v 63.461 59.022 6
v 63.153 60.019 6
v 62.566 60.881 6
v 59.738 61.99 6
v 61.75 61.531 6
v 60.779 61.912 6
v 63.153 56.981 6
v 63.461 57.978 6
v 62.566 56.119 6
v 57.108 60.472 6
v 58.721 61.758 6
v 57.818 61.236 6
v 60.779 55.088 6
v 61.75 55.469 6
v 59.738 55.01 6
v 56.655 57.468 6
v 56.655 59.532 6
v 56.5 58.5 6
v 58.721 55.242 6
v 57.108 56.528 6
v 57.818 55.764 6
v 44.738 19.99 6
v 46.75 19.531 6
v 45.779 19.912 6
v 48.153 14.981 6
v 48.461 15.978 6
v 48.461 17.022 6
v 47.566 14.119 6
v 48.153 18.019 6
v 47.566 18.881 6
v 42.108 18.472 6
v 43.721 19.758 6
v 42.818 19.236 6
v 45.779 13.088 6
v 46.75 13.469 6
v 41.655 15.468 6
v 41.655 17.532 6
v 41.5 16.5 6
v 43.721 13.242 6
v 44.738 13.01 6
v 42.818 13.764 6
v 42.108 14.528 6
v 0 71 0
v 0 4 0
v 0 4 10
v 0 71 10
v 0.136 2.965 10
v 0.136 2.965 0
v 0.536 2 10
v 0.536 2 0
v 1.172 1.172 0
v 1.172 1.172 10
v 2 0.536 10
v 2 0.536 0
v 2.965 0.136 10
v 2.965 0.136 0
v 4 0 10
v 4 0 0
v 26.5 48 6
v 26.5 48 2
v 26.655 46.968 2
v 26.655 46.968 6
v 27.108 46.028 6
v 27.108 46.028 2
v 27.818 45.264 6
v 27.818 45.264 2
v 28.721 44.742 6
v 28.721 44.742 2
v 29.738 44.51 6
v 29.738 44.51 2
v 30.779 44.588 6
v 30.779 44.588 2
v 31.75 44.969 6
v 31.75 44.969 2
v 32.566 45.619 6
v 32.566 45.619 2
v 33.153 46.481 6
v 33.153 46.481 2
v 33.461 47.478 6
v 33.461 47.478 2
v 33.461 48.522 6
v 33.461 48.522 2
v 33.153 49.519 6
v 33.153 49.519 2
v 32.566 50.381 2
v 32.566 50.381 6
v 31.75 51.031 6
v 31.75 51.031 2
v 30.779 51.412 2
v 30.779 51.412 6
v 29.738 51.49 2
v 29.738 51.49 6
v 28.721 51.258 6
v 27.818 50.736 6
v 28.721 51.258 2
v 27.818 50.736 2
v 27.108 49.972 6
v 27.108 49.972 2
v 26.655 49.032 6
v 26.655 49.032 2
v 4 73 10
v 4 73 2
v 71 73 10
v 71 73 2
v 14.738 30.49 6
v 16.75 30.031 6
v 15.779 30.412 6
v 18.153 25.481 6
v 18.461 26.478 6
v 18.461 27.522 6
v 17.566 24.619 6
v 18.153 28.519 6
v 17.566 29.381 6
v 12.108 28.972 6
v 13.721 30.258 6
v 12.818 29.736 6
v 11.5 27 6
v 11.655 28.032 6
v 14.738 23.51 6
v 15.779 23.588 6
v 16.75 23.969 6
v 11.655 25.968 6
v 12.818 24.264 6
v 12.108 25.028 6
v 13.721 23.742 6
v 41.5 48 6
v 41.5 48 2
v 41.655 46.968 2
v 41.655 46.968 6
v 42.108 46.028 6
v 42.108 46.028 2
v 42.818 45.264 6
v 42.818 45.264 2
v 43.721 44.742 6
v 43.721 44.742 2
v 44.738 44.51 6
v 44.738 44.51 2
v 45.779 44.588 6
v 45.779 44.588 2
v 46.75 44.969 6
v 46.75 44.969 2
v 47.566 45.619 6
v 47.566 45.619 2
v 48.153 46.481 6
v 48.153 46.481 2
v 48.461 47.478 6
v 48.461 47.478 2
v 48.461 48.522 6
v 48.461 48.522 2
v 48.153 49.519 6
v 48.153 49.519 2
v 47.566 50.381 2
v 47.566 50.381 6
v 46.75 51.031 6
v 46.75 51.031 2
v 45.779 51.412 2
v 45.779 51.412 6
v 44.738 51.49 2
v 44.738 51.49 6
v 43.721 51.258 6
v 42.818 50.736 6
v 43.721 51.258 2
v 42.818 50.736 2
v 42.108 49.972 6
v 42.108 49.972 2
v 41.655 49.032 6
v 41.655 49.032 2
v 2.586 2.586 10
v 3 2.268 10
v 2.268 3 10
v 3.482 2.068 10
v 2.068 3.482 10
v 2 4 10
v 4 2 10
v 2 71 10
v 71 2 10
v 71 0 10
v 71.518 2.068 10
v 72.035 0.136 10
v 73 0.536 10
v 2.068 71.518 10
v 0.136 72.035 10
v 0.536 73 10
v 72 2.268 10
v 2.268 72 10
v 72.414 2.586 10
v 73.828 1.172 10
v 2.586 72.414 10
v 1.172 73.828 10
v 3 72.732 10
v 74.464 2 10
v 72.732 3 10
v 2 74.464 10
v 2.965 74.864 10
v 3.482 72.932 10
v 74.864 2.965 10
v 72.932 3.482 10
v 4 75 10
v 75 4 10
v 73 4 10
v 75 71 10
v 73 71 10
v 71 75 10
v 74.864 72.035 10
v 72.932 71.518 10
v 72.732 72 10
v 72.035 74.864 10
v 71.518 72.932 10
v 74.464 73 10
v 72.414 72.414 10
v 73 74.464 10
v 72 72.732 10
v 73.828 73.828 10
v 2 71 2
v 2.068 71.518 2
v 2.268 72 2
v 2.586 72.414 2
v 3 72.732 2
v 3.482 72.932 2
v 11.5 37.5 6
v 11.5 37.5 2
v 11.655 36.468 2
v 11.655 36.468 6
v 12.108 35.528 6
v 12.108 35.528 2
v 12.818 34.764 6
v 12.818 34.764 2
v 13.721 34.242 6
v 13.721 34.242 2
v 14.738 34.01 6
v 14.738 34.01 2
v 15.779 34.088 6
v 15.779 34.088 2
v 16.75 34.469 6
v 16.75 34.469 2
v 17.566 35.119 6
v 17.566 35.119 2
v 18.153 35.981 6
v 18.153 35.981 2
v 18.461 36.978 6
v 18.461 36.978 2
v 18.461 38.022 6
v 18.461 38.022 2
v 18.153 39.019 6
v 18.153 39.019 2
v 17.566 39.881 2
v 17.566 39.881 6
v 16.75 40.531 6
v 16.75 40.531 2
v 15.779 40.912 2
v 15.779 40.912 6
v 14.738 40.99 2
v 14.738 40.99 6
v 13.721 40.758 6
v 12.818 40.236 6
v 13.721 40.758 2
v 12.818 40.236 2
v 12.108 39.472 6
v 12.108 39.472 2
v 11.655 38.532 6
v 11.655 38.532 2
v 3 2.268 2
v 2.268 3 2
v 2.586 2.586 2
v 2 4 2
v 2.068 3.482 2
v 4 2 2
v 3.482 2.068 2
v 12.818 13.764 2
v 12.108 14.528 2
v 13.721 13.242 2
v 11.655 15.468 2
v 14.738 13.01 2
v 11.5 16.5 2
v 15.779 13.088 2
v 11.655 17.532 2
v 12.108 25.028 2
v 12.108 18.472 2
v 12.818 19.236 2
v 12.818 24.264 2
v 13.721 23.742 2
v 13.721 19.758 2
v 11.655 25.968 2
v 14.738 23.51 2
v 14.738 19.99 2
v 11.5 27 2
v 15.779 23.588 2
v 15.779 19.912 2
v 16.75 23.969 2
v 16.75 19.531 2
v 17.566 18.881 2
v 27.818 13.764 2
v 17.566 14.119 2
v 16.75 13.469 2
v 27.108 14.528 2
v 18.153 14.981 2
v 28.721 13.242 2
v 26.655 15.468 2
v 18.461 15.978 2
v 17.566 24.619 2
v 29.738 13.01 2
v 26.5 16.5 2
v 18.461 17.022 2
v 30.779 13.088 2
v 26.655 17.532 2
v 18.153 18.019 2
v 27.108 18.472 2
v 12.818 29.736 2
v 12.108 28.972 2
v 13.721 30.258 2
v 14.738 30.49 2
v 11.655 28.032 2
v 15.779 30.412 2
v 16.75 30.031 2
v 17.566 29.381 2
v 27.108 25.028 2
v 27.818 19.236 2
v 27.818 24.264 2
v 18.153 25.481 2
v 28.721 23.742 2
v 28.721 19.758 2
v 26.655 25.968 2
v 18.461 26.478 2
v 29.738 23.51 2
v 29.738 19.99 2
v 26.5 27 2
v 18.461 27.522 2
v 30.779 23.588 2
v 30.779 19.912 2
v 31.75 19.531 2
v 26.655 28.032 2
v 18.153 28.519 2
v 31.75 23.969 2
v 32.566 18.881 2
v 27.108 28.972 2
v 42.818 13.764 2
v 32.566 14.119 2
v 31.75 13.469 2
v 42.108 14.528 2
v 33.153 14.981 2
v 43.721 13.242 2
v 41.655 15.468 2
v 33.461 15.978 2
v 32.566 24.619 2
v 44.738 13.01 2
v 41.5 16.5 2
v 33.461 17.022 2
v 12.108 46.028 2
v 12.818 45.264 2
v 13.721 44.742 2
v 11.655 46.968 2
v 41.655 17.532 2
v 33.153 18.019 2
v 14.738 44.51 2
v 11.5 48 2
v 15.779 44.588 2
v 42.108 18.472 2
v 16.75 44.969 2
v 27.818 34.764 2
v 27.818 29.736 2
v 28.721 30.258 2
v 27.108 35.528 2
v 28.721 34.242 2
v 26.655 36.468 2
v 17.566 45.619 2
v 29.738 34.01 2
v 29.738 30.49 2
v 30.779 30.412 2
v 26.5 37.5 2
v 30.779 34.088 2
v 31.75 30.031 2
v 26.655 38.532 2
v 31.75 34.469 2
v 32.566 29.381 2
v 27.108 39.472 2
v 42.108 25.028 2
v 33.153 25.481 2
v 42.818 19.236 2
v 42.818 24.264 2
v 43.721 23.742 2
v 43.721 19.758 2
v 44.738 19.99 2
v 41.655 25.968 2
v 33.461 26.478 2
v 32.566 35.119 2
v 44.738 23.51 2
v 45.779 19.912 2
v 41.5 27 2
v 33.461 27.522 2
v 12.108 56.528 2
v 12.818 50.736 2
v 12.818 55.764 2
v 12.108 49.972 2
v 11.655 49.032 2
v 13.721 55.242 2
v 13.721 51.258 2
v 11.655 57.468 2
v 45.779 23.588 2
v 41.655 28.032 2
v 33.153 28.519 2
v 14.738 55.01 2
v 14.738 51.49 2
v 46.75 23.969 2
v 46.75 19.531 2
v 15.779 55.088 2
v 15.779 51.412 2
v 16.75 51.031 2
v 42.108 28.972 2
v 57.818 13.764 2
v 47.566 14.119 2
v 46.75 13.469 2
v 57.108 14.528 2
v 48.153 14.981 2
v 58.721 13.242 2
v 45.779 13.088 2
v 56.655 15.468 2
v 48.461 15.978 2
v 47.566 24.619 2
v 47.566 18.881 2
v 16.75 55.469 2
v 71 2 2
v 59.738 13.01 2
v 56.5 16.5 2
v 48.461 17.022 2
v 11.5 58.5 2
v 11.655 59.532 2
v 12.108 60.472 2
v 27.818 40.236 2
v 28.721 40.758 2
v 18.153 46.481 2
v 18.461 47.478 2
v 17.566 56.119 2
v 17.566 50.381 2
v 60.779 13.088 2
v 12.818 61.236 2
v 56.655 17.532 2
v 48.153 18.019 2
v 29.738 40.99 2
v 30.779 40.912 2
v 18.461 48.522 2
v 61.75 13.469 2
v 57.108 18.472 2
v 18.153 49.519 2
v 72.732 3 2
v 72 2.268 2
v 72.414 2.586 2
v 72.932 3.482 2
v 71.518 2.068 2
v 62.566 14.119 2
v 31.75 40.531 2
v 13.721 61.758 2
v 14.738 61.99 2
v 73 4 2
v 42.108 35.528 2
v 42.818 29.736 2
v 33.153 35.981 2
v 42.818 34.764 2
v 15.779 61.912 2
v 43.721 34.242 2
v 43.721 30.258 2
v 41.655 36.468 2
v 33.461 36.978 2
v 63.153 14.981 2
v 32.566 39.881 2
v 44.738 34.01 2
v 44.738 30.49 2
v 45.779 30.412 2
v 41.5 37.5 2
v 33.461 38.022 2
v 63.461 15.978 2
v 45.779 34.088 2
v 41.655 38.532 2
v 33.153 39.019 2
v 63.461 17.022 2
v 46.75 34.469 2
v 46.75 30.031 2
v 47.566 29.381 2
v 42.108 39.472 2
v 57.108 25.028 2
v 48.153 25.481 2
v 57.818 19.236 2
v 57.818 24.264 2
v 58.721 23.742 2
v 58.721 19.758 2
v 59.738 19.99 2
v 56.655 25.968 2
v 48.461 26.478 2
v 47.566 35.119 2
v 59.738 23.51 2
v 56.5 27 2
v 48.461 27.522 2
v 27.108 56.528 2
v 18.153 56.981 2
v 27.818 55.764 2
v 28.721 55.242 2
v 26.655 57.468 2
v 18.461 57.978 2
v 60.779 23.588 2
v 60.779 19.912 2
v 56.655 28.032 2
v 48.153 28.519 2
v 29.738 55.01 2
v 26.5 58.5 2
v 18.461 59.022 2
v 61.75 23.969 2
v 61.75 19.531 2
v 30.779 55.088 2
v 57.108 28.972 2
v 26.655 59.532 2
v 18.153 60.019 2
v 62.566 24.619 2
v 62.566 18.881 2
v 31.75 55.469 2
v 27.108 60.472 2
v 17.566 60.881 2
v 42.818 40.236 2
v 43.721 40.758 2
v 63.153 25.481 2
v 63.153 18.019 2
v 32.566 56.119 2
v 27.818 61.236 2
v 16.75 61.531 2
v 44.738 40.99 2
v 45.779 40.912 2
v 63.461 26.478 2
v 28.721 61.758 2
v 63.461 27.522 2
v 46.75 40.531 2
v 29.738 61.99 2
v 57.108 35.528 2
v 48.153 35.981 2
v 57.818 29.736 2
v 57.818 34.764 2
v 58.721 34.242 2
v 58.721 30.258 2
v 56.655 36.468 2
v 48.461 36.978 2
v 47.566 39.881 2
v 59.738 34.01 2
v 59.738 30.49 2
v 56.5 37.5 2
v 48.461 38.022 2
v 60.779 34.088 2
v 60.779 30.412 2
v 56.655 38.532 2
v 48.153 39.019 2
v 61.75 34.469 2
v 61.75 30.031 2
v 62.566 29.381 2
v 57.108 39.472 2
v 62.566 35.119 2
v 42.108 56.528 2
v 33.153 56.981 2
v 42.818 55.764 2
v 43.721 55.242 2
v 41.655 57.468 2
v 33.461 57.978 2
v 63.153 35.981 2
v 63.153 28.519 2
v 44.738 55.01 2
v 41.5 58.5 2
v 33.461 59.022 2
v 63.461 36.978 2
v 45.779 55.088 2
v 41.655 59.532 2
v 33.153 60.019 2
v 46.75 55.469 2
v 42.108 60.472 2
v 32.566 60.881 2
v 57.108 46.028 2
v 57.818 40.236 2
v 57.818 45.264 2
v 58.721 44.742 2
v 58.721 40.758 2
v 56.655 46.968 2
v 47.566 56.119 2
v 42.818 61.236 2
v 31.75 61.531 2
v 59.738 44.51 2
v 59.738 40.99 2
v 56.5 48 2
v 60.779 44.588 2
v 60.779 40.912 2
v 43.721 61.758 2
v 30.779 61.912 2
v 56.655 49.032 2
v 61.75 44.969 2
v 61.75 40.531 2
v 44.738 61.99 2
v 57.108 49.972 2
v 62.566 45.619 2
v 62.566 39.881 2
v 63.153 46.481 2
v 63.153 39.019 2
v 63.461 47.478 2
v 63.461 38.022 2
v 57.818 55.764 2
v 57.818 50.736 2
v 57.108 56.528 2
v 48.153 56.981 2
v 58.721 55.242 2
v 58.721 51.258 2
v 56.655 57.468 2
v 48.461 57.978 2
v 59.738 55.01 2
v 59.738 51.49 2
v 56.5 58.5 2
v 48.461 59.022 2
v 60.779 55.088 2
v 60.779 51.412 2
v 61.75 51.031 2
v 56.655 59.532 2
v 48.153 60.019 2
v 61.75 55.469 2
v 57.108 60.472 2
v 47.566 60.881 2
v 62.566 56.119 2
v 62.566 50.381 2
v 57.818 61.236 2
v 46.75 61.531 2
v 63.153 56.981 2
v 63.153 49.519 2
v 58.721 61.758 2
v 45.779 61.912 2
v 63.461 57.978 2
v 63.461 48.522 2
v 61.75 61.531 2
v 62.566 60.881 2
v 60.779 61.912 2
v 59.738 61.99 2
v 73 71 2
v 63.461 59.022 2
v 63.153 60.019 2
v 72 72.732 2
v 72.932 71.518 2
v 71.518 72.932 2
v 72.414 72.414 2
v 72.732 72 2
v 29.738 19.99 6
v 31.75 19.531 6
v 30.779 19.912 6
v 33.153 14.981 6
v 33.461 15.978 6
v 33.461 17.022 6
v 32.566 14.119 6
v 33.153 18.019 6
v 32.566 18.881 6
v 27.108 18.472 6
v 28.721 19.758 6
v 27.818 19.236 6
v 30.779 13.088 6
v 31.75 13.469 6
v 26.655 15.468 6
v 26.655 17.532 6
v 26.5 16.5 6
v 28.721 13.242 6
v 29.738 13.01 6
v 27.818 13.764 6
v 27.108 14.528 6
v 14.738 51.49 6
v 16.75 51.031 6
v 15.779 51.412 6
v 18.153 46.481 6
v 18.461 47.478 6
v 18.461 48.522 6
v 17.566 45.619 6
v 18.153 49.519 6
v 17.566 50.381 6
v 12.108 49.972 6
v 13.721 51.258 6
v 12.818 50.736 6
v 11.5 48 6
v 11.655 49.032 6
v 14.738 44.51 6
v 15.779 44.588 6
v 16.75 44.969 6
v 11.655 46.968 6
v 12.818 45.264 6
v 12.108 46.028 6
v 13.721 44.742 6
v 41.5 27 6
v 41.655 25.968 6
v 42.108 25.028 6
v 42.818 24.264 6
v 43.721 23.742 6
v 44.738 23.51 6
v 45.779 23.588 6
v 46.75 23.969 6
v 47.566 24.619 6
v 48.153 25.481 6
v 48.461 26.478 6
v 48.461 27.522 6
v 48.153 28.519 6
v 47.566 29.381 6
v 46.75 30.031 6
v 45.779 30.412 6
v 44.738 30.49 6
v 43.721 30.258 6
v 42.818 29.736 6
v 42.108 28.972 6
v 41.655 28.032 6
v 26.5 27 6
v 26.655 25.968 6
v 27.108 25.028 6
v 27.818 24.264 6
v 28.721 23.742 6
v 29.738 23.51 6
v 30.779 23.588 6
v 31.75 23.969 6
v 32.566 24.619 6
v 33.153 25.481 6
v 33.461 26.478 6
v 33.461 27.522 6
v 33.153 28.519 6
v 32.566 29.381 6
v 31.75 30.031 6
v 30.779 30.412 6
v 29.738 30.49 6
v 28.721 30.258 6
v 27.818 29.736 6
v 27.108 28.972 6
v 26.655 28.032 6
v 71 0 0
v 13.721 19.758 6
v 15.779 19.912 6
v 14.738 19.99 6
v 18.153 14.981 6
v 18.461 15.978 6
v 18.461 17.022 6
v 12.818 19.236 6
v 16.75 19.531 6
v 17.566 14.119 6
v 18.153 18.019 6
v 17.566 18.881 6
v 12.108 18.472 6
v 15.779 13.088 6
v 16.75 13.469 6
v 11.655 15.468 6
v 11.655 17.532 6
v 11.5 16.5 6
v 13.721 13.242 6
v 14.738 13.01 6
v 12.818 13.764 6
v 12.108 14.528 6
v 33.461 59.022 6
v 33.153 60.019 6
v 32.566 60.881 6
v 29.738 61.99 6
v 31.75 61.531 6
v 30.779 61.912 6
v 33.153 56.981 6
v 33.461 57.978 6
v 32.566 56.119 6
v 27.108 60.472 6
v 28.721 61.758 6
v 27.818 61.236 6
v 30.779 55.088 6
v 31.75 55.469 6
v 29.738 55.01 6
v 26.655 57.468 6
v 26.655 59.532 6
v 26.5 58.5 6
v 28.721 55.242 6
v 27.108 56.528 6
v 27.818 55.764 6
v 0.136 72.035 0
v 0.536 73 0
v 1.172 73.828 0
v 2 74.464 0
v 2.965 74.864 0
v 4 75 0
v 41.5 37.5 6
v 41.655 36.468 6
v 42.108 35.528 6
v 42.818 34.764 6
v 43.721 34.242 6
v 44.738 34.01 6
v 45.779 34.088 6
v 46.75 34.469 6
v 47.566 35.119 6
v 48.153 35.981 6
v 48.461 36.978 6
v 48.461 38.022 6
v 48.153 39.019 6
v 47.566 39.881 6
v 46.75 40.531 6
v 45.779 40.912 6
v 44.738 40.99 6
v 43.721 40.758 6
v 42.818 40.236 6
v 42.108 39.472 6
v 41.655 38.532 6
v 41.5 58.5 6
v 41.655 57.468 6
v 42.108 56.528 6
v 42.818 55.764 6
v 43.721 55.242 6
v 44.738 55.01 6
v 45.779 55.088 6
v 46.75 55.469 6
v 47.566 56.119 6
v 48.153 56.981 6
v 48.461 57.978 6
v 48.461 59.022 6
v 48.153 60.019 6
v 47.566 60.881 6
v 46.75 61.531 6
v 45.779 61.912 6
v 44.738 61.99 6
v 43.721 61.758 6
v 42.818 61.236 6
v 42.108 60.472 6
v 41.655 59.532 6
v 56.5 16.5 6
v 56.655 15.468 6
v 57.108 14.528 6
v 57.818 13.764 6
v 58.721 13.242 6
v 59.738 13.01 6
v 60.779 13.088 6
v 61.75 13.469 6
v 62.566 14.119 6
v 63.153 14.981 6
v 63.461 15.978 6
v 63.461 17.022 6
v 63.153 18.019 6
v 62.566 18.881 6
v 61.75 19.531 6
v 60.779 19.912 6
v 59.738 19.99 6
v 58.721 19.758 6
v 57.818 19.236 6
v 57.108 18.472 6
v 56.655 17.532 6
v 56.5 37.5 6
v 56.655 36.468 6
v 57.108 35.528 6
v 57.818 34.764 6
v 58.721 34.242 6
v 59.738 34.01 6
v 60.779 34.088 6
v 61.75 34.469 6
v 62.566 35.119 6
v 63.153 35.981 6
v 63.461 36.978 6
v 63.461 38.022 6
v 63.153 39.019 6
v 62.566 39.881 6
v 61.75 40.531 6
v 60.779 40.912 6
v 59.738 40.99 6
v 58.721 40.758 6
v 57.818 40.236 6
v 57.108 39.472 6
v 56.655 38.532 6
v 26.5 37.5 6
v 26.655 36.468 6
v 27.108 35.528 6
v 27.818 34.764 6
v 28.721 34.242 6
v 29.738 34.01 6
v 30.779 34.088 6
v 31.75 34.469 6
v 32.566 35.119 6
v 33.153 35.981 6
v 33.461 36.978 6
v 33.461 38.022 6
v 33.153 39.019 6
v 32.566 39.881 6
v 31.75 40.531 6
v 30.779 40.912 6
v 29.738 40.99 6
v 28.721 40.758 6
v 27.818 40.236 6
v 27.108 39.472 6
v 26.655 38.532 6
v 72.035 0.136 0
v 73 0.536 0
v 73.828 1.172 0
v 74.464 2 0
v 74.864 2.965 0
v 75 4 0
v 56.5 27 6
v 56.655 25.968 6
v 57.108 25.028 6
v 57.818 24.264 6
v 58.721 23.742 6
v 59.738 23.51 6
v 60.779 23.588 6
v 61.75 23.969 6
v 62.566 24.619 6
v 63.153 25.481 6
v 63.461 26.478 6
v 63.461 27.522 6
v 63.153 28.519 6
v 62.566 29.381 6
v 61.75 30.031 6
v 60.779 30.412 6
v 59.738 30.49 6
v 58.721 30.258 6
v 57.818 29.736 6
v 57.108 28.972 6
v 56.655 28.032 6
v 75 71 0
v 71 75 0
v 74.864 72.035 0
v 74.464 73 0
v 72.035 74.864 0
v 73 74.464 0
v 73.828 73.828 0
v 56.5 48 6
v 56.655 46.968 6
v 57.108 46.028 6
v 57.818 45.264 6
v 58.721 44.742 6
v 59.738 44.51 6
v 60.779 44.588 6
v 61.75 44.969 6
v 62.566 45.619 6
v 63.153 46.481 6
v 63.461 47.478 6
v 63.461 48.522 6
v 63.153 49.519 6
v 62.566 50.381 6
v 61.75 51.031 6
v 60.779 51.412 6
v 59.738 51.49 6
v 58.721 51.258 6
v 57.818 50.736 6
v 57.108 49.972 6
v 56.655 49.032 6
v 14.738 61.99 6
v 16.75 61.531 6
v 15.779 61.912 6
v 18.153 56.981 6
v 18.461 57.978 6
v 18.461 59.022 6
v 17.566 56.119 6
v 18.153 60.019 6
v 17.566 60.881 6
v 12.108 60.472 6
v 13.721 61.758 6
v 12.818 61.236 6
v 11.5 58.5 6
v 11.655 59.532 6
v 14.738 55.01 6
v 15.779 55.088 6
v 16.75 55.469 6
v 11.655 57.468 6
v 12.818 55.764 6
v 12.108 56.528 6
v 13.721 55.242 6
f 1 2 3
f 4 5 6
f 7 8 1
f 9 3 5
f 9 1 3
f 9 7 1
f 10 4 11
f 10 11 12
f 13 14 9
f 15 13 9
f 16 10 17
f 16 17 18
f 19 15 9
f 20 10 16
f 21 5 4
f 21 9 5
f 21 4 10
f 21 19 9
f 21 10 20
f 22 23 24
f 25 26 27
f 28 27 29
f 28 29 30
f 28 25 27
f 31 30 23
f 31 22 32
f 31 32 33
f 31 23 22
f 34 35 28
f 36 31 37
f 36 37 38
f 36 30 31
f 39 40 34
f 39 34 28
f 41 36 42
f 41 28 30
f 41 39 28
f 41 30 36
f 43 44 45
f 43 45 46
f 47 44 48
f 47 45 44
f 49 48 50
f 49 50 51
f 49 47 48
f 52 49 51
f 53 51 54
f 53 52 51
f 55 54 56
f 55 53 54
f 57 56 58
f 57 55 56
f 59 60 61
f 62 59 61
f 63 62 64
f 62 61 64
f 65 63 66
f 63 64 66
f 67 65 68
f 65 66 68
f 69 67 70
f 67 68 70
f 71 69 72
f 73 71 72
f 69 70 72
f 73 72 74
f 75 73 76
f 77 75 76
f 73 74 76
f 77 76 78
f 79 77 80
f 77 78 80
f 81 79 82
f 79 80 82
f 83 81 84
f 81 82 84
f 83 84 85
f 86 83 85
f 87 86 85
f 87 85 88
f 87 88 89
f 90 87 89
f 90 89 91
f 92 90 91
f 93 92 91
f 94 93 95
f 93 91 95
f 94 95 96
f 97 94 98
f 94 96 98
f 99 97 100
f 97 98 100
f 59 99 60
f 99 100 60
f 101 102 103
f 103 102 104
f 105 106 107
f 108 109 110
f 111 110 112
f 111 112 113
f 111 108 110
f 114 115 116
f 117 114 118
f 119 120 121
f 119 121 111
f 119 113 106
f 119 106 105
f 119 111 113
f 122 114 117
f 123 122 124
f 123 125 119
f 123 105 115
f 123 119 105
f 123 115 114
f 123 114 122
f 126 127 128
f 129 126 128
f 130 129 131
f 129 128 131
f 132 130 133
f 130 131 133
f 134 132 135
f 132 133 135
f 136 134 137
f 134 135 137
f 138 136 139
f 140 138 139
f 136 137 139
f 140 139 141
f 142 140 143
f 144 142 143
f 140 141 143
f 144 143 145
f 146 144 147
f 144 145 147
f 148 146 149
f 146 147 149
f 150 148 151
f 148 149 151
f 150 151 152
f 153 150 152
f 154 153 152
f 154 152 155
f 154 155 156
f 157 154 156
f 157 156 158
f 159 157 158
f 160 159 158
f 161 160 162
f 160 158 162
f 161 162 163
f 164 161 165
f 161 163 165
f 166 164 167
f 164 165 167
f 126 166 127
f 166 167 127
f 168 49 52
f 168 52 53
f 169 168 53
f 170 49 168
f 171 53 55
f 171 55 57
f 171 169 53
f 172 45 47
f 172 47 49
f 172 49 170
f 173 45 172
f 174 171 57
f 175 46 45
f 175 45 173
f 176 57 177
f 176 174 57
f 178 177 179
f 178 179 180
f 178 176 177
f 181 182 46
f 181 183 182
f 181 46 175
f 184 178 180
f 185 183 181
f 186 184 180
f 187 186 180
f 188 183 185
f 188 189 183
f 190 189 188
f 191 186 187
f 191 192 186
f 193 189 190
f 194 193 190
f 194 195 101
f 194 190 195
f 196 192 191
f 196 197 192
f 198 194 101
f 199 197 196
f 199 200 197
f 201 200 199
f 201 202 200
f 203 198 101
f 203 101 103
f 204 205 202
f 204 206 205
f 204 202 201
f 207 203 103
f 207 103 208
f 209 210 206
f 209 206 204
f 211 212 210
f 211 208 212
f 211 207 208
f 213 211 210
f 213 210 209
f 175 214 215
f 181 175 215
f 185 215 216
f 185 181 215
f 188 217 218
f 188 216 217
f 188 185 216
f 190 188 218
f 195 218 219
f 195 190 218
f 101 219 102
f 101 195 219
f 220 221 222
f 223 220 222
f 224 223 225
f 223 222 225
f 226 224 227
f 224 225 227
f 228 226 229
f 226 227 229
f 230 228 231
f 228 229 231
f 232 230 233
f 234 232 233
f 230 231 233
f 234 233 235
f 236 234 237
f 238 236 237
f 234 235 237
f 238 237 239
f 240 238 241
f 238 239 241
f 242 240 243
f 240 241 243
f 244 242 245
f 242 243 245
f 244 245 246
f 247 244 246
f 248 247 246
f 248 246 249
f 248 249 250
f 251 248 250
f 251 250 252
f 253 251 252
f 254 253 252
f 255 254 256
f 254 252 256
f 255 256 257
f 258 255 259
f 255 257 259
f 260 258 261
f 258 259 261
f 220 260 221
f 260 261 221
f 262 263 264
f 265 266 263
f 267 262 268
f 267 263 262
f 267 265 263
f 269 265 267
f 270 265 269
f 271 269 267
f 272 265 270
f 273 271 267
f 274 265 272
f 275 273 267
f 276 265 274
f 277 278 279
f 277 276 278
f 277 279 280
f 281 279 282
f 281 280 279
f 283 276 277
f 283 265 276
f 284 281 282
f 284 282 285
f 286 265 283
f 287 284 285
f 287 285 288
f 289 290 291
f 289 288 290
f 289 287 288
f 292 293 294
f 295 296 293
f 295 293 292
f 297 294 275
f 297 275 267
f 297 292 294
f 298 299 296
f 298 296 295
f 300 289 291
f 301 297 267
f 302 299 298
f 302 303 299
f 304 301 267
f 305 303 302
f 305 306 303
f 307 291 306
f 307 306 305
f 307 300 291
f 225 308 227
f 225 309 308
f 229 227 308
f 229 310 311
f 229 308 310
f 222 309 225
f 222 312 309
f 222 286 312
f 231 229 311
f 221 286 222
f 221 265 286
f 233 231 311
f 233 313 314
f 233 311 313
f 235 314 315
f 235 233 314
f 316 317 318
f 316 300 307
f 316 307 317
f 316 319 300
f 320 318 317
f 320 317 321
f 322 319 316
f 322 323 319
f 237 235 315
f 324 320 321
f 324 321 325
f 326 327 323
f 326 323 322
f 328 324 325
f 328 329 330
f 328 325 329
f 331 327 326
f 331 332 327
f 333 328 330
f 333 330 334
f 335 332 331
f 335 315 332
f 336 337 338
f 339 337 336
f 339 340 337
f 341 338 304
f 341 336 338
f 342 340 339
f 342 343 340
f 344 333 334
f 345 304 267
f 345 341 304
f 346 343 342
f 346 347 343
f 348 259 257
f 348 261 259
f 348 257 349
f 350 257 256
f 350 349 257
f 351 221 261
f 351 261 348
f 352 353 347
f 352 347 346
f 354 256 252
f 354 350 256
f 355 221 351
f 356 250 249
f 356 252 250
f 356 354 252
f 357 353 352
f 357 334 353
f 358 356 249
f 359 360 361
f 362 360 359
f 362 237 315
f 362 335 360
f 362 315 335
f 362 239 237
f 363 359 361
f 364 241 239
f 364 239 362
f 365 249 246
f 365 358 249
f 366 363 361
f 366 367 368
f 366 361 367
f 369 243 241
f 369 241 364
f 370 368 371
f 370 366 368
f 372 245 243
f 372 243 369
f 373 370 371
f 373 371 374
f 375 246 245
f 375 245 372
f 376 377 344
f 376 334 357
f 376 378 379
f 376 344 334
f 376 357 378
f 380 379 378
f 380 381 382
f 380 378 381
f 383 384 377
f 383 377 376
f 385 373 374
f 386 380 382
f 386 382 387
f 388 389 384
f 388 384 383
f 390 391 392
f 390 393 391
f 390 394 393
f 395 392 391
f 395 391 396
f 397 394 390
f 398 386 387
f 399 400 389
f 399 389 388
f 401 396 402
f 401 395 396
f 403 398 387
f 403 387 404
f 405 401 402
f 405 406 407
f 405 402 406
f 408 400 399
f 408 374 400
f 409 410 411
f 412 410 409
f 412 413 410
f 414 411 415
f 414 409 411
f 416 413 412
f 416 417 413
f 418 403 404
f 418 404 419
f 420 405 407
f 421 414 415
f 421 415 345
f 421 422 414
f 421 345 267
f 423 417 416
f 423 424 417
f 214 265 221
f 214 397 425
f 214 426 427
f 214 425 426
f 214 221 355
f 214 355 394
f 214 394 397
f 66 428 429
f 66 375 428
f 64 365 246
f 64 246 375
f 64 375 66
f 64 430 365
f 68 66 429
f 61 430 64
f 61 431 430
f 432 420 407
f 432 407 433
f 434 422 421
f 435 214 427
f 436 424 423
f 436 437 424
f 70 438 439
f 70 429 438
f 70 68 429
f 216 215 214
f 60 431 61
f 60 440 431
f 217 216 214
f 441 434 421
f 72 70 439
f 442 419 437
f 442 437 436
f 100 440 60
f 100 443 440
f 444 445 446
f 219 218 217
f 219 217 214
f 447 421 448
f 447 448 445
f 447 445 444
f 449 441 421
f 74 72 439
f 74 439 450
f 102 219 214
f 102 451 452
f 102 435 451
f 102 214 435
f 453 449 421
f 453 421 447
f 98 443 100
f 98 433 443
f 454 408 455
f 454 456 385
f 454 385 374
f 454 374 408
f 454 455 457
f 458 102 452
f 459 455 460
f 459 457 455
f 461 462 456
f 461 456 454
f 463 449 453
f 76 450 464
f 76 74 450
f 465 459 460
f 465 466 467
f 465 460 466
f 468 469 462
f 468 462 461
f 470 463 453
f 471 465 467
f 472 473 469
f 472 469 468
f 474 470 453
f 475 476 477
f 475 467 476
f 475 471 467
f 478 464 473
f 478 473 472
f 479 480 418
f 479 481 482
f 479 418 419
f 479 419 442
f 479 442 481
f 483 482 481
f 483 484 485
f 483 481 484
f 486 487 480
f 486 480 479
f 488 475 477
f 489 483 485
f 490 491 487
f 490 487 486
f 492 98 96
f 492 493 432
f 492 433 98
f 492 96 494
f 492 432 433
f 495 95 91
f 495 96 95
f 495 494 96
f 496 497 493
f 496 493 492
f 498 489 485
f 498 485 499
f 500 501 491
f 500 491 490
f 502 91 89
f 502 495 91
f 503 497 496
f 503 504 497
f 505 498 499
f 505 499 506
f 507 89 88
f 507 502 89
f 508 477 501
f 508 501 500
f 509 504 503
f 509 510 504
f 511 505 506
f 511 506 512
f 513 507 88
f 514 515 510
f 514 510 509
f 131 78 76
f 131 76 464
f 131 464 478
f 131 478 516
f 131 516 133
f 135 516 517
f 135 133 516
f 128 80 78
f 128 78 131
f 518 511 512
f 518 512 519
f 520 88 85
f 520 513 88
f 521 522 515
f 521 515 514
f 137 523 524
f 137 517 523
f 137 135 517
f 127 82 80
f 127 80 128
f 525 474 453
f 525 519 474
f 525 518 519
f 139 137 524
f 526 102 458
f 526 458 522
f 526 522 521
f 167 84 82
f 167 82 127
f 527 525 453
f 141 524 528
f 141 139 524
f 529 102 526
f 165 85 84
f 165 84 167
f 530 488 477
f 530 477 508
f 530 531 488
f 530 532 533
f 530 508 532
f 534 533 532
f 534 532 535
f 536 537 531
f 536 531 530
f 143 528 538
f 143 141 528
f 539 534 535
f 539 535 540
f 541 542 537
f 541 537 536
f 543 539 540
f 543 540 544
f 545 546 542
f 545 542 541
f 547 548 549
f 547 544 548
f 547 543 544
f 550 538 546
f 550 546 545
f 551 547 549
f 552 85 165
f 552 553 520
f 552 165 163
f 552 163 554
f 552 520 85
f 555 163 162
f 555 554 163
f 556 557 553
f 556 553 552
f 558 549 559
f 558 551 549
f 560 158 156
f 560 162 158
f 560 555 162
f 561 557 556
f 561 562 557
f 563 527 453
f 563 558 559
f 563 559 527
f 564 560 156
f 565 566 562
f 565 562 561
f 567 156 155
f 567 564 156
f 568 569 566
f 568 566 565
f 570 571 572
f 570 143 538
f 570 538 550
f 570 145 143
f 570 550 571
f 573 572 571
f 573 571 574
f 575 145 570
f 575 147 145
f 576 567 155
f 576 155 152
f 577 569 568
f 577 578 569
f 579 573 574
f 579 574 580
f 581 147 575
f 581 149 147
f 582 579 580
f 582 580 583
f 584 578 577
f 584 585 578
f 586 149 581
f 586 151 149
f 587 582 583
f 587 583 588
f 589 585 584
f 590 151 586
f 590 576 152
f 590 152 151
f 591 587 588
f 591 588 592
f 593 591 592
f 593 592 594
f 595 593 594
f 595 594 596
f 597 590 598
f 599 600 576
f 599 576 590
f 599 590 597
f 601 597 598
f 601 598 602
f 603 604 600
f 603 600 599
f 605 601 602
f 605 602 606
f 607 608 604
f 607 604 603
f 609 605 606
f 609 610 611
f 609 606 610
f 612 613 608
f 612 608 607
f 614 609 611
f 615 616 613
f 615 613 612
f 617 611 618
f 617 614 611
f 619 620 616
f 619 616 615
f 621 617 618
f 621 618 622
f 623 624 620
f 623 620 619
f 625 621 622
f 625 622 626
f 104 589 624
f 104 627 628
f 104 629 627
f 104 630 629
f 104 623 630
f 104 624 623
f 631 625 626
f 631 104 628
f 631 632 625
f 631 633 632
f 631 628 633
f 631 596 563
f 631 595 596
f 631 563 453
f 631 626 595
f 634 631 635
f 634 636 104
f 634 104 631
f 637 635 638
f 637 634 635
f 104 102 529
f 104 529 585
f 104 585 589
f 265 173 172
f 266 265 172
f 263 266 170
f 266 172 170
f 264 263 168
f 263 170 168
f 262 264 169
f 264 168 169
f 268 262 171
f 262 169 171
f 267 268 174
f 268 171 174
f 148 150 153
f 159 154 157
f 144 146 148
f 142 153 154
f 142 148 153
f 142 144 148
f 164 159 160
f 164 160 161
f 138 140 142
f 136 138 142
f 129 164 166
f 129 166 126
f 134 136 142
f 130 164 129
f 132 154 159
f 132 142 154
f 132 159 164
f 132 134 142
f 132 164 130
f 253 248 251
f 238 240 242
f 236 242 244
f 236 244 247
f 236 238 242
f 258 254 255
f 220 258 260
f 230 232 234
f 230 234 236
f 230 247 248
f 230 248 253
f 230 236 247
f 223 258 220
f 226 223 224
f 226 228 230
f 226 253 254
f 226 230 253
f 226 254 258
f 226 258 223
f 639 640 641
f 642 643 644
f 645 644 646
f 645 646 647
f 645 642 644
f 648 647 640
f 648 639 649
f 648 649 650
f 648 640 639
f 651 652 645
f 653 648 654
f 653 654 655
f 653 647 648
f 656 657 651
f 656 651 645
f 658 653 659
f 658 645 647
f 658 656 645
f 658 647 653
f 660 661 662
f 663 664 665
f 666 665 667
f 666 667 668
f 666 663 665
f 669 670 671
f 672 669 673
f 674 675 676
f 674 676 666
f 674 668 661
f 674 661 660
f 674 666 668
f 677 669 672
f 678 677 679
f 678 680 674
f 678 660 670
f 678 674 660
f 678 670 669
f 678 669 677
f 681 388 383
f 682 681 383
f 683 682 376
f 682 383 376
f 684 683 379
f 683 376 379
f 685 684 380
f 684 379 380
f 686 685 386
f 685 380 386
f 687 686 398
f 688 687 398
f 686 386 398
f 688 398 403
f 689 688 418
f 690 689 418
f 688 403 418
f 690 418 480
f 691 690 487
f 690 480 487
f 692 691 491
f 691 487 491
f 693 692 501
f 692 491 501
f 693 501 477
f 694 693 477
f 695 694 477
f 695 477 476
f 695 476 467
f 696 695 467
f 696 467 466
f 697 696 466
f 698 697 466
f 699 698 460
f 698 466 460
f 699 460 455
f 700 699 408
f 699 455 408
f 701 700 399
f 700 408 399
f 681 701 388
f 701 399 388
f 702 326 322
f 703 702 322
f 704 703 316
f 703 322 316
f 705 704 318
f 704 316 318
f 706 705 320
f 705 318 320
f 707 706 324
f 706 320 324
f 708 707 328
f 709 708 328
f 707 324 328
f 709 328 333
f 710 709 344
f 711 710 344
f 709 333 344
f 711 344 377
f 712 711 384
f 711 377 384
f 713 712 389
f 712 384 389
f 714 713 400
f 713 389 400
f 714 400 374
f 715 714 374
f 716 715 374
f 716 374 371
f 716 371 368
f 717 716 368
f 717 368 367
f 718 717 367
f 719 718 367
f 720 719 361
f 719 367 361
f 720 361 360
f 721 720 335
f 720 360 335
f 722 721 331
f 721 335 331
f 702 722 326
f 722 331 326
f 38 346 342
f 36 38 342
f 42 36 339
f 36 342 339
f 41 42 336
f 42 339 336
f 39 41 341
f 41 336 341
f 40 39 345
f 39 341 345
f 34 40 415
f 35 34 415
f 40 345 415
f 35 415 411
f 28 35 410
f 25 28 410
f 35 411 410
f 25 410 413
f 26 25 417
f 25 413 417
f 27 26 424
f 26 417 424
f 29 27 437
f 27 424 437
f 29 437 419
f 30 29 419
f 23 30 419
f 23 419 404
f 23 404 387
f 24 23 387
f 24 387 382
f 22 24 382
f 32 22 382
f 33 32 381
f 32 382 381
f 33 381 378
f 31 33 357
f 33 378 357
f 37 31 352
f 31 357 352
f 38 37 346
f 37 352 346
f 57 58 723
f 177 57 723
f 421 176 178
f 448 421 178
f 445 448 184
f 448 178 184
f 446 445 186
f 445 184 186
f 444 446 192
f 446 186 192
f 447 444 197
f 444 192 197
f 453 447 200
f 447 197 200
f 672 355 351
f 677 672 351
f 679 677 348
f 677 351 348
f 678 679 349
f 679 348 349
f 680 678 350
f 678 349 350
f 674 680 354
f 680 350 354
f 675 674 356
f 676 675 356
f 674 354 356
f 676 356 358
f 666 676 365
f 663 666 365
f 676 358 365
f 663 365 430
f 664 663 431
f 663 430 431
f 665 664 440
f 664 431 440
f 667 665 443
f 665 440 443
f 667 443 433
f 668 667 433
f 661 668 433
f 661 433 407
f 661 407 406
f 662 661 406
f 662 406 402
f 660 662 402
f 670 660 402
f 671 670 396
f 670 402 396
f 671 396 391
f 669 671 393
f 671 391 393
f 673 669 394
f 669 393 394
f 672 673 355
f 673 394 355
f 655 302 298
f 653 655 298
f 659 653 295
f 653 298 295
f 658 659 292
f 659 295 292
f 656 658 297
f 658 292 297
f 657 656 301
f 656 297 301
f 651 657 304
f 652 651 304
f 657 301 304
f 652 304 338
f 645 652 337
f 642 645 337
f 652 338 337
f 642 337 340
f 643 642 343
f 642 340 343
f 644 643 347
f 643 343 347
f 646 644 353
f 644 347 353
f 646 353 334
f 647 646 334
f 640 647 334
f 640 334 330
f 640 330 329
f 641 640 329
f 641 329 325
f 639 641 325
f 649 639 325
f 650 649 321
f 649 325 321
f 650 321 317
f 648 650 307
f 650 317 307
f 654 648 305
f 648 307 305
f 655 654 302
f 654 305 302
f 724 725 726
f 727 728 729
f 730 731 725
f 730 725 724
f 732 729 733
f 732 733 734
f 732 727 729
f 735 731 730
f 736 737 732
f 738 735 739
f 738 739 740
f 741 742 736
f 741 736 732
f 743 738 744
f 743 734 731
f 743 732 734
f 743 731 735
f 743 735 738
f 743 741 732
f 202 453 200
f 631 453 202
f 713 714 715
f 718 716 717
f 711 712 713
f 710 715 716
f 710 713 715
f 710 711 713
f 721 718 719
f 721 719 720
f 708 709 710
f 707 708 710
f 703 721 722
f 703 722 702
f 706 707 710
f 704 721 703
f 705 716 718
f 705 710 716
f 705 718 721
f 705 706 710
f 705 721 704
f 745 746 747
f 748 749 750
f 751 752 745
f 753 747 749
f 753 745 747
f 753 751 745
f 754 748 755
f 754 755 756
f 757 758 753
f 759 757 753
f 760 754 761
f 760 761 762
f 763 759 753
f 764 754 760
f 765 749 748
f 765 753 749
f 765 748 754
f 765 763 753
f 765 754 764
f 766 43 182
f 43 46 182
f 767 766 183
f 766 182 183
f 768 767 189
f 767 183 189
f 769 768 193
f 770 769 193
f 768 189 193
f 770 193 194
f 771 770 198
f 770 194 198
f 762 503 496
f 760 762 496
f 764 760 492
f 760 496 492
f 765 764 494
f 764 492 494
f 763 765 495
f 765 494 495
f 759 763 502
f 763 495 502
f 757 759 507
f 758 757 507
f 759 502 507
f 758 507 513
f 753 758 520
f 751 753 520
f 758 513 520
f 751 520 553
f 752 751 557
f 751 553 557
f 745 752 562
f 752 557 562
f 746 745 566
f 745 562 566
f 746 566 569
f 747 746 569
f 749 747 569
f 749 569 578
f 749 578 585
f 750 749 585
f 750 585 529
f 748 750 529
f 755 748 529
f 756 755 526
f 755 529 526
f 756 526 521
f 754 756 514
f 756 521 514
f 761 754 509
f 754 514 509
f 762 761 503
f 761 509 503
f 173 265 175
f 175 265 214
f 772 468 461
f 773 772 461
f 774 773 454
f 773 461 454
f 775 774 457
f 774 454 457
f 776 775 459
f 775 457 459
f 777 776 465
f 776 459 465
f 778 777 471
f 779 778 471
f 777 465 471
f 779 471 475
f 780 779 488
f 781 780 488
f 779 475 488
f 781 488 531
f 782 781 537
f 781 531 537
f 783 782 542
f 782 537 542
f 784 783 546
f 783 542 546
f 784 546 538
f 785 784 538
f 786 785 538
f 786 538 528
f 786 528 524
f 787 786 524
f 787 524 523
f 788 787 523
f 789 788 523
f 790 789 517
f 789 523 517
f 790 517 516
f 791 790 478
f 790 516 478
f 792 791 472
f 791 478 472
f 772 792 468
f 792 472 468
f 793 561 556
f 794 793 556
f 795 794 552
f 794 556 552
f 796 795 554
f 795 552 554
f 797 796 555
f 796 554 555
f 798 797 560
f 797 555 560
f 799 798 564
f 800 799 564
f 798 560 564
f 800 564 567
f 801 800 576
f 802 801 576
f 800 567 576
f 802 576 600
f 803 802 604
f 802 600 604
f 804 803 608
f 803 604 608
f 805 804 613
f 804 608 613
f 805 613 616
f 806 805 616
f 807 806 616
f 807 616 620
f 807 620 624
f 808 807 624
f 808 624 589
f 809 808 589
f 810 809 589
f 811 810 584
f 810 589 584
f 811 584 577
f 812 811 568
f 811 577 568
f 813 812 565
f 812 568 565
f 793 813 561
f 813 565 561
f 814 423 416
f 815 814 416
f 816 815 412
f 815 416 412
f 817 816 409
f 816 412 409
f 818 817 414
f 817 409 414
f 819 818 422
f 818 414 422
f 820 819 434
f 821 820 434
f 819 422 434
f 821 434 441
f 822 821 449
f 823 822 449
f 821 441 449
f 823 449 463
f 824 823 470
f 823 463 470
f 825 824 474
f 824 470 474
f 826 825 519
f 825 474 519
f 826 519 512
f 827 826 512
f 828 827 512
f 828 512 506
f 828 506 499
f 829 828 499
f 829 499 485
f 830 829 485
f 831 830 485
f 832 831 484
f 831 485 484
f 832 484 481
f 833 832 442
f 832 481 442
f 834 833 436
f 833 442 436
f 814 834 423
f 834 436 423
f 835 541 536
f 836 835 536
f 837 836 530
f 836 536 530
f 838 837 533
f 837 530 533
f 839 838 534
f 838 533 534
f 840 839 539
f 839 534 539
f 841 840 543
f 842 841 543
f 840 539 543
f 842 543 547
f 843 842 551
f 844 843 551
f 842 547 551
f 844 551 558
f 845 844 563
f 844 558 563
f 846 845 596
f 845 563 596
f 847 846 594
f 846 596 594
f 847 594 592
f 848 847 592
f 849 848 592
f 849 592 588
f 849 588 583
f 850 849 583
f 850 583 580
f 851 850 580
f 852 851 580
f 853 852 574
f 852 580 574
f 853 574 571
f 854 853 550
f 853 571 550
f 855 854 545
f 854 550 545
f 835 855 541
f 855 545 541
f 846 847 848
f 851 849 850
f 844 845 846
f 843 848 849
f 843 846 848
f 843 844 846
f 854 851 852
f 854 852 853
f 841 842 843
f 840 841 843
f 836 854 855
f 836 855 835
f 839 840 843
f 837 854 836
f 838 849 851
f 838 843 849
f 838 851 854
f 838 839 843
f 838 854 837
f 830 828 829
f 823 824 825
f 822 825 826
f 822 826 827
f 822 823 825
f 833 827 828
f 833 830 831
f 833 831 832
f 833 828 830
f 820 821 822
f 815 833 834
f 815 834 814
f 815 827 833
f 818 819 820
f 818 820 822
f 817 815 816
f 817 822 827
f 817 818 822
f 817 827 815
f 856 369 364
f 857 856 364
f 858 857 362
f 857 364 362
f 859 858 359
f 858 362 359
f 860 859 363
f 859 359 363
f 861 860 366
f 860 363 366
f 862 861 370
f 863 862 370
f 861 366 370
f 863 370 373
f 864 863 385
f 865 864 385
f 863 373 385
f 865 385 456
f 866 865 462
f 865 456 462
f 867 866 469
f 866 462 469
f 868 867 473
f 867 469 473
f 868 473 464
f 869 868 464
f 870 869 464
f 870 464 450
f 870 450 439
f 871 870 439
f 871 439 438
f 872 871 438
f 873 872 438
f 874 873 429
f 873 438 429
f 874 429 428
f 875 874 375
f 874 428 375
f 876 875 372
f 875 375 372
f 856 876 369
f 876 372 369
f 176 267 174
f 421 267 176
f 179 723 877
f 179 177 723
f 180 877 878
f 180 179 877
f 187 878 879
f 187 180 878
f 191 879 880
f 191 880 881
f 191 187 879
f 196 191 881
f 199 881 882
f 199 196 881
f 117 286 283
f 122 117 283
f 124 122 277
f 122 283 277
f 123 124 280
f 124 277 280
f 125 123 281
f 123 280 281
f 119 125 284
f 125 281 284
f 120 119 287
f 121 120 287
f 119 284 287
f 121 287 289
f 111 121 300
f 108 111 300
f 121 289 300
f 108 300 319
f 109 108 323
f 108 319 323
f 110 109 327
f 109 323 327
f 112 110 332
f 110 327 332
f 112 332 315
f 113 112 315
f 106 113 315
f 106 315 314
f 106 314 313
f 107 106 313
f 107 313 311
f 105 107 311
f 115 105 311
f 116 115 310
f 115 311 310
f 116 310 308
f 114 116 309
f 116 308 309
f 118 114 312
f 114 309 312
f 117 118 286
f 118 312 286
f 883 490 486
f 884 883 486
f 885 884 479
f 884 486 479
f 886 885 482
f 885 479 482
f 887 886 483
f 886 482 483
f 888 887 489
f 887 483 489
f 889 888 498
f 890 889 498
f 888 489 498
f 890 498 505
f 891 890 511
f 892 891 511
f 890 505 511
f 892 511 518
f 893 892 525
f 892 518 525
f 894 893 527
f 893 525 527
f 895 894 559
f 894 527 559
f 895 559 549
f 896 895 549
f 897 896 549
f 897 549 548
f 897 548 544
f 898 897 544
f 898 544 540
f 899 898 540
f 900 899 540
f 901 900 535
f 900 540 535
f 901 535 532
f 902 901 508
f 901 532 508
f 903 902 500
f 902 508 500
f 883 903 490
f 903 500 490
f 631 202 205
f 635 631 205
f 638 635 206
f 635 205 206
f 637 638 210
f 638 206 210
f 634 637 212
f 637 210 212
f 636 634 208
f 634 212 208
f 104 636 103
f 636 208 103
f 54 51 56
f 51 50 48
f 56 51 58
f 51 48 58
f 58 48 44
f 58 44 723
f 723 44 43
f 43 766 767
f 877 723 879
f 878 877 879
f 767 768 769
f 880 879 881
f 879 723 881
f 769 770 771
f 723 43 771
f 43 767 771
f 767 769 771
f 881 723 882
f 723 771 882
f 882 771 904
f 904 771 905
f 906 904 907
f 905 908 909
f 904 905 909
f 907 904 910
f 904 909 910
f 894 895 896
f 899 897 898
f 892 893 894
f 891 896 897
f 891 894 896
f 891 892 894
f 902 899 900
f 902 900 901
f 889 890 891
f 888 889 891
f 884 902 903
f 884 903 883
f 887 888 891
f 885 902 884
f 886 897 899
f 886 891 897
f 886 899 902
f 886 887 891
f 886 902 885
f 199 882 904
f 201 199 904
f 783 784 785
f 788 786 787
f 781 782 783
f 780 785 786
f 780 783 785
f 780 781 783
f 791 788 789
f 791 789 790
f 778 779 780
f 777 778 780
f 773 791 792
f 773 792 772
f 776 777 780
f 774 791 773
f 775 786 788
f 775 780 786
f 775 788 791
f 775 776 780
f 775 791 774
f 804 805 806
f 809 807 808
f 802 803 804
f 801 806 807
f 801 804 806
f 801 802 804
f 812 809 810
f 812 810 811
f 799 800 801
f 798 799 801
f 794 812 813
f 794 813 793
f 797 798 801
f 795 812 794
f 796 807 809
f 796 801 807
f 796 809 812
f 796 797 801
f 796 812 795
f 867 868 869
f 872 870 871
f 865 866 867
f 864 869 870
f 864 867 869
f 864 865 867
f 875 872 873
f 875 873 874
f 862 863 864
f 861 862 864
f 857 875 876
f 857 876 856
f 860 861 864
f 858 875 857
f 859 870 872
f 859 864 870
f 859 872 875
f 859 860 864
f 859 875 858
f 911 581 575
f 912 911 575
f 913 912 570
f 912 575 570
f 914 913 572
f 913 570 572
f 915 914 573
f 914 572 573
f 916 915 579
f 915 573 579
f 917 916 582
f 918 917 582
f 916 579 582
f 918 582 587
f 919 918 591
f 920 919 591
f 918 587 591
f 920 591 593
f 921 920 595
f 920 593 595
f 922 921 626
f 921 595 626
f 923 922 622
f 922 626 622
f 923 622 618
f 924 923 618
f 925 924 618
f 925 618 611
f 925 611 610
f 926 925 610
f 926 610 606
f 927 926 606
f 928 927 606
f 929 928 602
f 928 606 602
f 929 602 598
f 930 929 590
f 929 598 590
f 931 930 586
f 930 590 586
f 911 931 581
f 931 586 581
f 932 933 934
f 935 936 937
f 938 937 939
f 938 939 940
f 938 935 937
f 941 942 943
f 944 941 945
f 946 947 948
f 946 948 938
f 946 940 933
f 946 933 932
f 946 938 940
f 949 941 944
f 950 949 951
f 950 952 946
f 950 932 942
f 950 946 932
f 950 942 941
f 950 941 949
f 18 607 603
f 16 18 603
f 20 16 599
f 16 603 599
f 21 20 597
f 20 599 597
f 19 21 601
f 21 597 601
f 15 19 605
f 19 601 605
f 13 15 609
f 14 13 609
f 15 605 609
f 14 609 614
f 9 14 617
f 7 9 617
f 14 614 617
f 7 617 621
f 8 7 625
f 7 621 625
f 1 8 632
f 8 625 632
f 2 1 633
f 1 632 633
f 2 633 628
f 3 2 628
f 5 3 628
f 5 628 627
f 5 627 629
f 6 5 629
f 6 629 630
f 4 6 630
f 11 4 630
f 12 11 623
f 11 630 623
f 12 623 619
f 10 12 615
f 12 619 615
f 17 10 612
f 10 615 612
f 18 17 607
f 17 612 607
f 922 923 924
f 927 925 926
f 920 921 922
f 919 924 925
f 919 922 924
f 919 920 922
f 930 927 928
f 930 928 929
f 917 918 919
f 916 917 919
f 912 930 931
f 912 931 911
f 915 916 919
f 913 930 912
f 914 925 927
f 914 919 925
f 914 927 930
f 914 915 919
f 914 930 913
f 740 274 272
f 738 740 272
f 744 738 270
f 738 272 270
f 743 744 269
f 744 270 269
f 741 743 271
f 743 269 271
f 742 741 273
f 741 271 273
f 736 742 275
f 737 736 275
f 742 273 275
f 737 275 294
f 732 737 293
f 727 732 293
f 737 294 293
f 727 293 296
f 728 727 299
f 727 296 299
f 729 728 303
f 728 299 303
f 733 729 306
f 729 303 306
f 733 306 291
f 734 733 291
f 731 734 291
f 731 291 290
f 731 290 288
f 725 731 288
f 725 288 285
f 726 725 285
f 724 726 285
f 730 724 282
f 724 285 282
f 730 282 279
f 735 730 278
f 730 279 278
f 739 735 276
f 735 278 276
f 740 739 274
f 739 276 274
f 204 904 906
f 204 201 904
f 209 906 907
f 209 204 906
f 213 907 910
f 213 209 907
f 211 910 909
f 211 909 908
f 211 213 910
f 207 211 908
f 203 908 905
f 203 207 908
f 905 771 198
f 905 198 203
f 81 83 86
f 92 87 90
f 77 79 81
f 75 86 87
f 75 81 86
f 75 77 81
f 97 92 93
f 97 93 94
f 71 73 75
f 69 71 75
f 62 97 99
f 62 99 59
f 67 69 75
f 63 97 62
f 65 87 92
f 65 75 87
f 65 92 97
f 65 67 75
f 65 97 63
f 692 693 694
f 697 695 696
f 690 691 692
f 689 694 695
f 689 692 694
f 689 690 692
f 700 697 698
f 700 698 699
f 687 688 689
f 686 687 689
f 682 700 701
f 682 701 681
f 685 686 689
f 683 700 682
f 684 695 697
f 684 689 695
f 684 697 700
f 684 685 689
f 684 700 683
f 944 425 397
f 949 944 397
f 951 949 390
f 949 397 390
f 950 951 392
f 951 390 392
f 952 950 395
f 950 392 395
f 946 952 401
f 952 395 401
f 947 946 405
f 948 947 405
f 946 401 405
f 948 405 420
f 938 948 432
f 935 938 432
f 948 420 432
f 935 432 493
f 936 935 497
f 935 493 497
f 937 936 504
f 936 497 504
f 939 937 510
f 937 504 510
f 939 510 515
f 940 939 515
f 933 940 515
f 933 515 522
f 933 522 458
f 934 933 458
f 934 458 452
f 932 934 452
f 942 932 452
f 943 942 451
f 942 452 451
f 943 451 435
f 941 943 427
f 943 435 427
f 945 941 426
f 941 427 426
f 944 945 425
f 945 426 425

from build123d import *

# Parameters (mm, degrees)
SKETCH1_W           = 75
SKETCH1_H           = 75
BOSS_EXTRUDE1_DEPTH = 10
FILLET1_R           = 4
SHELL1_T            = -2
SKETCH2_R           = 3.5
BOSS_EXTRUDE2_DEPTH = 4


with BuildPart() as part:
    # Sketch1 → Boss-Extrude1 (new body)
    with BuildSketch(Plane.XY):
        with Locations((37.5, 37.5)):
            Rectangle(SKETCH1_W, SKETCH1_H)
    extrude(amount=BOSS_EXTRUDE1_DEPTH)

    # Fillet1
    fillet1_edges = [part.edges().sort_by_distance(p)[0] for p in [
        (0, 75, 5),
        (75, 75, 5),
        (75, 0, 5),
        (0, 0, 5),
    ]]
    fillet(fillet1_edges, radius=FILLET1_R)

    # Shell1
    shell1_openings = [part.faces().sort_by_distance(p)[0] for p in [
        (37.5, 37.5, 10),
    ]]
    offset(amount=SHELL1_T, openings=shell1_openings, kind=Kind.INTERSECTION)

    # Sketch2 → Boss-Extrude2 (add)
    with BuildSketch(Plane.XY.offset(2)):
        with Locations(Location((15, 58.5, 0), (0, 0, 180))):
            Circle(SKETCH2_R)
        with Locations(Location((30, 58.5, 0), (0, 0, 180))):
            Circle(SKETCH2_R)
        with Locations(Location((45, 58.5, 0), (0, 0, 180))):
            Circle(SKETCH2_R)
        with Locations(Location((60, 58.5, 0), (0, 0, 180))):
            Circle(SKETCH2_R)
        with Locations(Location((30, 48, 0), (0, 0, 180))):
            Circle(SKETCH2_R)
        with Locations(Location((45, 48, 0), (0, 0, 180))):
            Circle(SKETCH2_R)
        with Locations(Location((60, 48, 0), (0, 0, 180))):
            Circle(SKETCH2_R)
        with Locations(Location((30, 37.5, 0), (0, 0, 180))):
            Circle(SKETCH2_R)
        with Locations(Location((45, 37.5, 0), (0, 0, 180))):
            Circle(SKETCH2_R)
        with Locations(Location((60, 37.5, 0), (0, 0, 180))):
            Circle(SKETCH2_R)
        with Locations(Location((30, 27, 0), (0, 0, 180))):
            Circle(SKETCH2_R)
        with Locations(Location((45, 27, 0), (0, 0, 180))):
            Circle(SKETCH2_R)
        with Locations(Location((60, 27, 0), (0, 0, 180))):
            Circle(SKETCH2_R)
        with Locations(Location((30, 16.5, 0), (0, 0, 180))):
            Circle(SKETCH2_R)
        with Locations(Location((45, 16.5, 0), (0, 0, 180))):
            Circle(SKETCH2_R)
        with Locations(Location((60, 16.5, 0), (0, 0, 180))):
            Circle(SKETCH2_R)
        with Locations(Location((15, 48, 0), (0, 0, 180))):
            Circle(SKETCH2_R)
        with Locations(Location((15, 37.5, 0), (0, 0, 180))):
            Circle(SKETCH2_R)
        with Locations(Location((15, 27, 0), (0, 0, 180))):
            Circle(SKETCH2_R)
        with Locations(Location((15, 16.5, 0), (0, 0, 180))):
            Circle(SKETCH2_R)
    extrude(amount=BOSS_EXTRUDE2_DEPTH)


solid = part.part
